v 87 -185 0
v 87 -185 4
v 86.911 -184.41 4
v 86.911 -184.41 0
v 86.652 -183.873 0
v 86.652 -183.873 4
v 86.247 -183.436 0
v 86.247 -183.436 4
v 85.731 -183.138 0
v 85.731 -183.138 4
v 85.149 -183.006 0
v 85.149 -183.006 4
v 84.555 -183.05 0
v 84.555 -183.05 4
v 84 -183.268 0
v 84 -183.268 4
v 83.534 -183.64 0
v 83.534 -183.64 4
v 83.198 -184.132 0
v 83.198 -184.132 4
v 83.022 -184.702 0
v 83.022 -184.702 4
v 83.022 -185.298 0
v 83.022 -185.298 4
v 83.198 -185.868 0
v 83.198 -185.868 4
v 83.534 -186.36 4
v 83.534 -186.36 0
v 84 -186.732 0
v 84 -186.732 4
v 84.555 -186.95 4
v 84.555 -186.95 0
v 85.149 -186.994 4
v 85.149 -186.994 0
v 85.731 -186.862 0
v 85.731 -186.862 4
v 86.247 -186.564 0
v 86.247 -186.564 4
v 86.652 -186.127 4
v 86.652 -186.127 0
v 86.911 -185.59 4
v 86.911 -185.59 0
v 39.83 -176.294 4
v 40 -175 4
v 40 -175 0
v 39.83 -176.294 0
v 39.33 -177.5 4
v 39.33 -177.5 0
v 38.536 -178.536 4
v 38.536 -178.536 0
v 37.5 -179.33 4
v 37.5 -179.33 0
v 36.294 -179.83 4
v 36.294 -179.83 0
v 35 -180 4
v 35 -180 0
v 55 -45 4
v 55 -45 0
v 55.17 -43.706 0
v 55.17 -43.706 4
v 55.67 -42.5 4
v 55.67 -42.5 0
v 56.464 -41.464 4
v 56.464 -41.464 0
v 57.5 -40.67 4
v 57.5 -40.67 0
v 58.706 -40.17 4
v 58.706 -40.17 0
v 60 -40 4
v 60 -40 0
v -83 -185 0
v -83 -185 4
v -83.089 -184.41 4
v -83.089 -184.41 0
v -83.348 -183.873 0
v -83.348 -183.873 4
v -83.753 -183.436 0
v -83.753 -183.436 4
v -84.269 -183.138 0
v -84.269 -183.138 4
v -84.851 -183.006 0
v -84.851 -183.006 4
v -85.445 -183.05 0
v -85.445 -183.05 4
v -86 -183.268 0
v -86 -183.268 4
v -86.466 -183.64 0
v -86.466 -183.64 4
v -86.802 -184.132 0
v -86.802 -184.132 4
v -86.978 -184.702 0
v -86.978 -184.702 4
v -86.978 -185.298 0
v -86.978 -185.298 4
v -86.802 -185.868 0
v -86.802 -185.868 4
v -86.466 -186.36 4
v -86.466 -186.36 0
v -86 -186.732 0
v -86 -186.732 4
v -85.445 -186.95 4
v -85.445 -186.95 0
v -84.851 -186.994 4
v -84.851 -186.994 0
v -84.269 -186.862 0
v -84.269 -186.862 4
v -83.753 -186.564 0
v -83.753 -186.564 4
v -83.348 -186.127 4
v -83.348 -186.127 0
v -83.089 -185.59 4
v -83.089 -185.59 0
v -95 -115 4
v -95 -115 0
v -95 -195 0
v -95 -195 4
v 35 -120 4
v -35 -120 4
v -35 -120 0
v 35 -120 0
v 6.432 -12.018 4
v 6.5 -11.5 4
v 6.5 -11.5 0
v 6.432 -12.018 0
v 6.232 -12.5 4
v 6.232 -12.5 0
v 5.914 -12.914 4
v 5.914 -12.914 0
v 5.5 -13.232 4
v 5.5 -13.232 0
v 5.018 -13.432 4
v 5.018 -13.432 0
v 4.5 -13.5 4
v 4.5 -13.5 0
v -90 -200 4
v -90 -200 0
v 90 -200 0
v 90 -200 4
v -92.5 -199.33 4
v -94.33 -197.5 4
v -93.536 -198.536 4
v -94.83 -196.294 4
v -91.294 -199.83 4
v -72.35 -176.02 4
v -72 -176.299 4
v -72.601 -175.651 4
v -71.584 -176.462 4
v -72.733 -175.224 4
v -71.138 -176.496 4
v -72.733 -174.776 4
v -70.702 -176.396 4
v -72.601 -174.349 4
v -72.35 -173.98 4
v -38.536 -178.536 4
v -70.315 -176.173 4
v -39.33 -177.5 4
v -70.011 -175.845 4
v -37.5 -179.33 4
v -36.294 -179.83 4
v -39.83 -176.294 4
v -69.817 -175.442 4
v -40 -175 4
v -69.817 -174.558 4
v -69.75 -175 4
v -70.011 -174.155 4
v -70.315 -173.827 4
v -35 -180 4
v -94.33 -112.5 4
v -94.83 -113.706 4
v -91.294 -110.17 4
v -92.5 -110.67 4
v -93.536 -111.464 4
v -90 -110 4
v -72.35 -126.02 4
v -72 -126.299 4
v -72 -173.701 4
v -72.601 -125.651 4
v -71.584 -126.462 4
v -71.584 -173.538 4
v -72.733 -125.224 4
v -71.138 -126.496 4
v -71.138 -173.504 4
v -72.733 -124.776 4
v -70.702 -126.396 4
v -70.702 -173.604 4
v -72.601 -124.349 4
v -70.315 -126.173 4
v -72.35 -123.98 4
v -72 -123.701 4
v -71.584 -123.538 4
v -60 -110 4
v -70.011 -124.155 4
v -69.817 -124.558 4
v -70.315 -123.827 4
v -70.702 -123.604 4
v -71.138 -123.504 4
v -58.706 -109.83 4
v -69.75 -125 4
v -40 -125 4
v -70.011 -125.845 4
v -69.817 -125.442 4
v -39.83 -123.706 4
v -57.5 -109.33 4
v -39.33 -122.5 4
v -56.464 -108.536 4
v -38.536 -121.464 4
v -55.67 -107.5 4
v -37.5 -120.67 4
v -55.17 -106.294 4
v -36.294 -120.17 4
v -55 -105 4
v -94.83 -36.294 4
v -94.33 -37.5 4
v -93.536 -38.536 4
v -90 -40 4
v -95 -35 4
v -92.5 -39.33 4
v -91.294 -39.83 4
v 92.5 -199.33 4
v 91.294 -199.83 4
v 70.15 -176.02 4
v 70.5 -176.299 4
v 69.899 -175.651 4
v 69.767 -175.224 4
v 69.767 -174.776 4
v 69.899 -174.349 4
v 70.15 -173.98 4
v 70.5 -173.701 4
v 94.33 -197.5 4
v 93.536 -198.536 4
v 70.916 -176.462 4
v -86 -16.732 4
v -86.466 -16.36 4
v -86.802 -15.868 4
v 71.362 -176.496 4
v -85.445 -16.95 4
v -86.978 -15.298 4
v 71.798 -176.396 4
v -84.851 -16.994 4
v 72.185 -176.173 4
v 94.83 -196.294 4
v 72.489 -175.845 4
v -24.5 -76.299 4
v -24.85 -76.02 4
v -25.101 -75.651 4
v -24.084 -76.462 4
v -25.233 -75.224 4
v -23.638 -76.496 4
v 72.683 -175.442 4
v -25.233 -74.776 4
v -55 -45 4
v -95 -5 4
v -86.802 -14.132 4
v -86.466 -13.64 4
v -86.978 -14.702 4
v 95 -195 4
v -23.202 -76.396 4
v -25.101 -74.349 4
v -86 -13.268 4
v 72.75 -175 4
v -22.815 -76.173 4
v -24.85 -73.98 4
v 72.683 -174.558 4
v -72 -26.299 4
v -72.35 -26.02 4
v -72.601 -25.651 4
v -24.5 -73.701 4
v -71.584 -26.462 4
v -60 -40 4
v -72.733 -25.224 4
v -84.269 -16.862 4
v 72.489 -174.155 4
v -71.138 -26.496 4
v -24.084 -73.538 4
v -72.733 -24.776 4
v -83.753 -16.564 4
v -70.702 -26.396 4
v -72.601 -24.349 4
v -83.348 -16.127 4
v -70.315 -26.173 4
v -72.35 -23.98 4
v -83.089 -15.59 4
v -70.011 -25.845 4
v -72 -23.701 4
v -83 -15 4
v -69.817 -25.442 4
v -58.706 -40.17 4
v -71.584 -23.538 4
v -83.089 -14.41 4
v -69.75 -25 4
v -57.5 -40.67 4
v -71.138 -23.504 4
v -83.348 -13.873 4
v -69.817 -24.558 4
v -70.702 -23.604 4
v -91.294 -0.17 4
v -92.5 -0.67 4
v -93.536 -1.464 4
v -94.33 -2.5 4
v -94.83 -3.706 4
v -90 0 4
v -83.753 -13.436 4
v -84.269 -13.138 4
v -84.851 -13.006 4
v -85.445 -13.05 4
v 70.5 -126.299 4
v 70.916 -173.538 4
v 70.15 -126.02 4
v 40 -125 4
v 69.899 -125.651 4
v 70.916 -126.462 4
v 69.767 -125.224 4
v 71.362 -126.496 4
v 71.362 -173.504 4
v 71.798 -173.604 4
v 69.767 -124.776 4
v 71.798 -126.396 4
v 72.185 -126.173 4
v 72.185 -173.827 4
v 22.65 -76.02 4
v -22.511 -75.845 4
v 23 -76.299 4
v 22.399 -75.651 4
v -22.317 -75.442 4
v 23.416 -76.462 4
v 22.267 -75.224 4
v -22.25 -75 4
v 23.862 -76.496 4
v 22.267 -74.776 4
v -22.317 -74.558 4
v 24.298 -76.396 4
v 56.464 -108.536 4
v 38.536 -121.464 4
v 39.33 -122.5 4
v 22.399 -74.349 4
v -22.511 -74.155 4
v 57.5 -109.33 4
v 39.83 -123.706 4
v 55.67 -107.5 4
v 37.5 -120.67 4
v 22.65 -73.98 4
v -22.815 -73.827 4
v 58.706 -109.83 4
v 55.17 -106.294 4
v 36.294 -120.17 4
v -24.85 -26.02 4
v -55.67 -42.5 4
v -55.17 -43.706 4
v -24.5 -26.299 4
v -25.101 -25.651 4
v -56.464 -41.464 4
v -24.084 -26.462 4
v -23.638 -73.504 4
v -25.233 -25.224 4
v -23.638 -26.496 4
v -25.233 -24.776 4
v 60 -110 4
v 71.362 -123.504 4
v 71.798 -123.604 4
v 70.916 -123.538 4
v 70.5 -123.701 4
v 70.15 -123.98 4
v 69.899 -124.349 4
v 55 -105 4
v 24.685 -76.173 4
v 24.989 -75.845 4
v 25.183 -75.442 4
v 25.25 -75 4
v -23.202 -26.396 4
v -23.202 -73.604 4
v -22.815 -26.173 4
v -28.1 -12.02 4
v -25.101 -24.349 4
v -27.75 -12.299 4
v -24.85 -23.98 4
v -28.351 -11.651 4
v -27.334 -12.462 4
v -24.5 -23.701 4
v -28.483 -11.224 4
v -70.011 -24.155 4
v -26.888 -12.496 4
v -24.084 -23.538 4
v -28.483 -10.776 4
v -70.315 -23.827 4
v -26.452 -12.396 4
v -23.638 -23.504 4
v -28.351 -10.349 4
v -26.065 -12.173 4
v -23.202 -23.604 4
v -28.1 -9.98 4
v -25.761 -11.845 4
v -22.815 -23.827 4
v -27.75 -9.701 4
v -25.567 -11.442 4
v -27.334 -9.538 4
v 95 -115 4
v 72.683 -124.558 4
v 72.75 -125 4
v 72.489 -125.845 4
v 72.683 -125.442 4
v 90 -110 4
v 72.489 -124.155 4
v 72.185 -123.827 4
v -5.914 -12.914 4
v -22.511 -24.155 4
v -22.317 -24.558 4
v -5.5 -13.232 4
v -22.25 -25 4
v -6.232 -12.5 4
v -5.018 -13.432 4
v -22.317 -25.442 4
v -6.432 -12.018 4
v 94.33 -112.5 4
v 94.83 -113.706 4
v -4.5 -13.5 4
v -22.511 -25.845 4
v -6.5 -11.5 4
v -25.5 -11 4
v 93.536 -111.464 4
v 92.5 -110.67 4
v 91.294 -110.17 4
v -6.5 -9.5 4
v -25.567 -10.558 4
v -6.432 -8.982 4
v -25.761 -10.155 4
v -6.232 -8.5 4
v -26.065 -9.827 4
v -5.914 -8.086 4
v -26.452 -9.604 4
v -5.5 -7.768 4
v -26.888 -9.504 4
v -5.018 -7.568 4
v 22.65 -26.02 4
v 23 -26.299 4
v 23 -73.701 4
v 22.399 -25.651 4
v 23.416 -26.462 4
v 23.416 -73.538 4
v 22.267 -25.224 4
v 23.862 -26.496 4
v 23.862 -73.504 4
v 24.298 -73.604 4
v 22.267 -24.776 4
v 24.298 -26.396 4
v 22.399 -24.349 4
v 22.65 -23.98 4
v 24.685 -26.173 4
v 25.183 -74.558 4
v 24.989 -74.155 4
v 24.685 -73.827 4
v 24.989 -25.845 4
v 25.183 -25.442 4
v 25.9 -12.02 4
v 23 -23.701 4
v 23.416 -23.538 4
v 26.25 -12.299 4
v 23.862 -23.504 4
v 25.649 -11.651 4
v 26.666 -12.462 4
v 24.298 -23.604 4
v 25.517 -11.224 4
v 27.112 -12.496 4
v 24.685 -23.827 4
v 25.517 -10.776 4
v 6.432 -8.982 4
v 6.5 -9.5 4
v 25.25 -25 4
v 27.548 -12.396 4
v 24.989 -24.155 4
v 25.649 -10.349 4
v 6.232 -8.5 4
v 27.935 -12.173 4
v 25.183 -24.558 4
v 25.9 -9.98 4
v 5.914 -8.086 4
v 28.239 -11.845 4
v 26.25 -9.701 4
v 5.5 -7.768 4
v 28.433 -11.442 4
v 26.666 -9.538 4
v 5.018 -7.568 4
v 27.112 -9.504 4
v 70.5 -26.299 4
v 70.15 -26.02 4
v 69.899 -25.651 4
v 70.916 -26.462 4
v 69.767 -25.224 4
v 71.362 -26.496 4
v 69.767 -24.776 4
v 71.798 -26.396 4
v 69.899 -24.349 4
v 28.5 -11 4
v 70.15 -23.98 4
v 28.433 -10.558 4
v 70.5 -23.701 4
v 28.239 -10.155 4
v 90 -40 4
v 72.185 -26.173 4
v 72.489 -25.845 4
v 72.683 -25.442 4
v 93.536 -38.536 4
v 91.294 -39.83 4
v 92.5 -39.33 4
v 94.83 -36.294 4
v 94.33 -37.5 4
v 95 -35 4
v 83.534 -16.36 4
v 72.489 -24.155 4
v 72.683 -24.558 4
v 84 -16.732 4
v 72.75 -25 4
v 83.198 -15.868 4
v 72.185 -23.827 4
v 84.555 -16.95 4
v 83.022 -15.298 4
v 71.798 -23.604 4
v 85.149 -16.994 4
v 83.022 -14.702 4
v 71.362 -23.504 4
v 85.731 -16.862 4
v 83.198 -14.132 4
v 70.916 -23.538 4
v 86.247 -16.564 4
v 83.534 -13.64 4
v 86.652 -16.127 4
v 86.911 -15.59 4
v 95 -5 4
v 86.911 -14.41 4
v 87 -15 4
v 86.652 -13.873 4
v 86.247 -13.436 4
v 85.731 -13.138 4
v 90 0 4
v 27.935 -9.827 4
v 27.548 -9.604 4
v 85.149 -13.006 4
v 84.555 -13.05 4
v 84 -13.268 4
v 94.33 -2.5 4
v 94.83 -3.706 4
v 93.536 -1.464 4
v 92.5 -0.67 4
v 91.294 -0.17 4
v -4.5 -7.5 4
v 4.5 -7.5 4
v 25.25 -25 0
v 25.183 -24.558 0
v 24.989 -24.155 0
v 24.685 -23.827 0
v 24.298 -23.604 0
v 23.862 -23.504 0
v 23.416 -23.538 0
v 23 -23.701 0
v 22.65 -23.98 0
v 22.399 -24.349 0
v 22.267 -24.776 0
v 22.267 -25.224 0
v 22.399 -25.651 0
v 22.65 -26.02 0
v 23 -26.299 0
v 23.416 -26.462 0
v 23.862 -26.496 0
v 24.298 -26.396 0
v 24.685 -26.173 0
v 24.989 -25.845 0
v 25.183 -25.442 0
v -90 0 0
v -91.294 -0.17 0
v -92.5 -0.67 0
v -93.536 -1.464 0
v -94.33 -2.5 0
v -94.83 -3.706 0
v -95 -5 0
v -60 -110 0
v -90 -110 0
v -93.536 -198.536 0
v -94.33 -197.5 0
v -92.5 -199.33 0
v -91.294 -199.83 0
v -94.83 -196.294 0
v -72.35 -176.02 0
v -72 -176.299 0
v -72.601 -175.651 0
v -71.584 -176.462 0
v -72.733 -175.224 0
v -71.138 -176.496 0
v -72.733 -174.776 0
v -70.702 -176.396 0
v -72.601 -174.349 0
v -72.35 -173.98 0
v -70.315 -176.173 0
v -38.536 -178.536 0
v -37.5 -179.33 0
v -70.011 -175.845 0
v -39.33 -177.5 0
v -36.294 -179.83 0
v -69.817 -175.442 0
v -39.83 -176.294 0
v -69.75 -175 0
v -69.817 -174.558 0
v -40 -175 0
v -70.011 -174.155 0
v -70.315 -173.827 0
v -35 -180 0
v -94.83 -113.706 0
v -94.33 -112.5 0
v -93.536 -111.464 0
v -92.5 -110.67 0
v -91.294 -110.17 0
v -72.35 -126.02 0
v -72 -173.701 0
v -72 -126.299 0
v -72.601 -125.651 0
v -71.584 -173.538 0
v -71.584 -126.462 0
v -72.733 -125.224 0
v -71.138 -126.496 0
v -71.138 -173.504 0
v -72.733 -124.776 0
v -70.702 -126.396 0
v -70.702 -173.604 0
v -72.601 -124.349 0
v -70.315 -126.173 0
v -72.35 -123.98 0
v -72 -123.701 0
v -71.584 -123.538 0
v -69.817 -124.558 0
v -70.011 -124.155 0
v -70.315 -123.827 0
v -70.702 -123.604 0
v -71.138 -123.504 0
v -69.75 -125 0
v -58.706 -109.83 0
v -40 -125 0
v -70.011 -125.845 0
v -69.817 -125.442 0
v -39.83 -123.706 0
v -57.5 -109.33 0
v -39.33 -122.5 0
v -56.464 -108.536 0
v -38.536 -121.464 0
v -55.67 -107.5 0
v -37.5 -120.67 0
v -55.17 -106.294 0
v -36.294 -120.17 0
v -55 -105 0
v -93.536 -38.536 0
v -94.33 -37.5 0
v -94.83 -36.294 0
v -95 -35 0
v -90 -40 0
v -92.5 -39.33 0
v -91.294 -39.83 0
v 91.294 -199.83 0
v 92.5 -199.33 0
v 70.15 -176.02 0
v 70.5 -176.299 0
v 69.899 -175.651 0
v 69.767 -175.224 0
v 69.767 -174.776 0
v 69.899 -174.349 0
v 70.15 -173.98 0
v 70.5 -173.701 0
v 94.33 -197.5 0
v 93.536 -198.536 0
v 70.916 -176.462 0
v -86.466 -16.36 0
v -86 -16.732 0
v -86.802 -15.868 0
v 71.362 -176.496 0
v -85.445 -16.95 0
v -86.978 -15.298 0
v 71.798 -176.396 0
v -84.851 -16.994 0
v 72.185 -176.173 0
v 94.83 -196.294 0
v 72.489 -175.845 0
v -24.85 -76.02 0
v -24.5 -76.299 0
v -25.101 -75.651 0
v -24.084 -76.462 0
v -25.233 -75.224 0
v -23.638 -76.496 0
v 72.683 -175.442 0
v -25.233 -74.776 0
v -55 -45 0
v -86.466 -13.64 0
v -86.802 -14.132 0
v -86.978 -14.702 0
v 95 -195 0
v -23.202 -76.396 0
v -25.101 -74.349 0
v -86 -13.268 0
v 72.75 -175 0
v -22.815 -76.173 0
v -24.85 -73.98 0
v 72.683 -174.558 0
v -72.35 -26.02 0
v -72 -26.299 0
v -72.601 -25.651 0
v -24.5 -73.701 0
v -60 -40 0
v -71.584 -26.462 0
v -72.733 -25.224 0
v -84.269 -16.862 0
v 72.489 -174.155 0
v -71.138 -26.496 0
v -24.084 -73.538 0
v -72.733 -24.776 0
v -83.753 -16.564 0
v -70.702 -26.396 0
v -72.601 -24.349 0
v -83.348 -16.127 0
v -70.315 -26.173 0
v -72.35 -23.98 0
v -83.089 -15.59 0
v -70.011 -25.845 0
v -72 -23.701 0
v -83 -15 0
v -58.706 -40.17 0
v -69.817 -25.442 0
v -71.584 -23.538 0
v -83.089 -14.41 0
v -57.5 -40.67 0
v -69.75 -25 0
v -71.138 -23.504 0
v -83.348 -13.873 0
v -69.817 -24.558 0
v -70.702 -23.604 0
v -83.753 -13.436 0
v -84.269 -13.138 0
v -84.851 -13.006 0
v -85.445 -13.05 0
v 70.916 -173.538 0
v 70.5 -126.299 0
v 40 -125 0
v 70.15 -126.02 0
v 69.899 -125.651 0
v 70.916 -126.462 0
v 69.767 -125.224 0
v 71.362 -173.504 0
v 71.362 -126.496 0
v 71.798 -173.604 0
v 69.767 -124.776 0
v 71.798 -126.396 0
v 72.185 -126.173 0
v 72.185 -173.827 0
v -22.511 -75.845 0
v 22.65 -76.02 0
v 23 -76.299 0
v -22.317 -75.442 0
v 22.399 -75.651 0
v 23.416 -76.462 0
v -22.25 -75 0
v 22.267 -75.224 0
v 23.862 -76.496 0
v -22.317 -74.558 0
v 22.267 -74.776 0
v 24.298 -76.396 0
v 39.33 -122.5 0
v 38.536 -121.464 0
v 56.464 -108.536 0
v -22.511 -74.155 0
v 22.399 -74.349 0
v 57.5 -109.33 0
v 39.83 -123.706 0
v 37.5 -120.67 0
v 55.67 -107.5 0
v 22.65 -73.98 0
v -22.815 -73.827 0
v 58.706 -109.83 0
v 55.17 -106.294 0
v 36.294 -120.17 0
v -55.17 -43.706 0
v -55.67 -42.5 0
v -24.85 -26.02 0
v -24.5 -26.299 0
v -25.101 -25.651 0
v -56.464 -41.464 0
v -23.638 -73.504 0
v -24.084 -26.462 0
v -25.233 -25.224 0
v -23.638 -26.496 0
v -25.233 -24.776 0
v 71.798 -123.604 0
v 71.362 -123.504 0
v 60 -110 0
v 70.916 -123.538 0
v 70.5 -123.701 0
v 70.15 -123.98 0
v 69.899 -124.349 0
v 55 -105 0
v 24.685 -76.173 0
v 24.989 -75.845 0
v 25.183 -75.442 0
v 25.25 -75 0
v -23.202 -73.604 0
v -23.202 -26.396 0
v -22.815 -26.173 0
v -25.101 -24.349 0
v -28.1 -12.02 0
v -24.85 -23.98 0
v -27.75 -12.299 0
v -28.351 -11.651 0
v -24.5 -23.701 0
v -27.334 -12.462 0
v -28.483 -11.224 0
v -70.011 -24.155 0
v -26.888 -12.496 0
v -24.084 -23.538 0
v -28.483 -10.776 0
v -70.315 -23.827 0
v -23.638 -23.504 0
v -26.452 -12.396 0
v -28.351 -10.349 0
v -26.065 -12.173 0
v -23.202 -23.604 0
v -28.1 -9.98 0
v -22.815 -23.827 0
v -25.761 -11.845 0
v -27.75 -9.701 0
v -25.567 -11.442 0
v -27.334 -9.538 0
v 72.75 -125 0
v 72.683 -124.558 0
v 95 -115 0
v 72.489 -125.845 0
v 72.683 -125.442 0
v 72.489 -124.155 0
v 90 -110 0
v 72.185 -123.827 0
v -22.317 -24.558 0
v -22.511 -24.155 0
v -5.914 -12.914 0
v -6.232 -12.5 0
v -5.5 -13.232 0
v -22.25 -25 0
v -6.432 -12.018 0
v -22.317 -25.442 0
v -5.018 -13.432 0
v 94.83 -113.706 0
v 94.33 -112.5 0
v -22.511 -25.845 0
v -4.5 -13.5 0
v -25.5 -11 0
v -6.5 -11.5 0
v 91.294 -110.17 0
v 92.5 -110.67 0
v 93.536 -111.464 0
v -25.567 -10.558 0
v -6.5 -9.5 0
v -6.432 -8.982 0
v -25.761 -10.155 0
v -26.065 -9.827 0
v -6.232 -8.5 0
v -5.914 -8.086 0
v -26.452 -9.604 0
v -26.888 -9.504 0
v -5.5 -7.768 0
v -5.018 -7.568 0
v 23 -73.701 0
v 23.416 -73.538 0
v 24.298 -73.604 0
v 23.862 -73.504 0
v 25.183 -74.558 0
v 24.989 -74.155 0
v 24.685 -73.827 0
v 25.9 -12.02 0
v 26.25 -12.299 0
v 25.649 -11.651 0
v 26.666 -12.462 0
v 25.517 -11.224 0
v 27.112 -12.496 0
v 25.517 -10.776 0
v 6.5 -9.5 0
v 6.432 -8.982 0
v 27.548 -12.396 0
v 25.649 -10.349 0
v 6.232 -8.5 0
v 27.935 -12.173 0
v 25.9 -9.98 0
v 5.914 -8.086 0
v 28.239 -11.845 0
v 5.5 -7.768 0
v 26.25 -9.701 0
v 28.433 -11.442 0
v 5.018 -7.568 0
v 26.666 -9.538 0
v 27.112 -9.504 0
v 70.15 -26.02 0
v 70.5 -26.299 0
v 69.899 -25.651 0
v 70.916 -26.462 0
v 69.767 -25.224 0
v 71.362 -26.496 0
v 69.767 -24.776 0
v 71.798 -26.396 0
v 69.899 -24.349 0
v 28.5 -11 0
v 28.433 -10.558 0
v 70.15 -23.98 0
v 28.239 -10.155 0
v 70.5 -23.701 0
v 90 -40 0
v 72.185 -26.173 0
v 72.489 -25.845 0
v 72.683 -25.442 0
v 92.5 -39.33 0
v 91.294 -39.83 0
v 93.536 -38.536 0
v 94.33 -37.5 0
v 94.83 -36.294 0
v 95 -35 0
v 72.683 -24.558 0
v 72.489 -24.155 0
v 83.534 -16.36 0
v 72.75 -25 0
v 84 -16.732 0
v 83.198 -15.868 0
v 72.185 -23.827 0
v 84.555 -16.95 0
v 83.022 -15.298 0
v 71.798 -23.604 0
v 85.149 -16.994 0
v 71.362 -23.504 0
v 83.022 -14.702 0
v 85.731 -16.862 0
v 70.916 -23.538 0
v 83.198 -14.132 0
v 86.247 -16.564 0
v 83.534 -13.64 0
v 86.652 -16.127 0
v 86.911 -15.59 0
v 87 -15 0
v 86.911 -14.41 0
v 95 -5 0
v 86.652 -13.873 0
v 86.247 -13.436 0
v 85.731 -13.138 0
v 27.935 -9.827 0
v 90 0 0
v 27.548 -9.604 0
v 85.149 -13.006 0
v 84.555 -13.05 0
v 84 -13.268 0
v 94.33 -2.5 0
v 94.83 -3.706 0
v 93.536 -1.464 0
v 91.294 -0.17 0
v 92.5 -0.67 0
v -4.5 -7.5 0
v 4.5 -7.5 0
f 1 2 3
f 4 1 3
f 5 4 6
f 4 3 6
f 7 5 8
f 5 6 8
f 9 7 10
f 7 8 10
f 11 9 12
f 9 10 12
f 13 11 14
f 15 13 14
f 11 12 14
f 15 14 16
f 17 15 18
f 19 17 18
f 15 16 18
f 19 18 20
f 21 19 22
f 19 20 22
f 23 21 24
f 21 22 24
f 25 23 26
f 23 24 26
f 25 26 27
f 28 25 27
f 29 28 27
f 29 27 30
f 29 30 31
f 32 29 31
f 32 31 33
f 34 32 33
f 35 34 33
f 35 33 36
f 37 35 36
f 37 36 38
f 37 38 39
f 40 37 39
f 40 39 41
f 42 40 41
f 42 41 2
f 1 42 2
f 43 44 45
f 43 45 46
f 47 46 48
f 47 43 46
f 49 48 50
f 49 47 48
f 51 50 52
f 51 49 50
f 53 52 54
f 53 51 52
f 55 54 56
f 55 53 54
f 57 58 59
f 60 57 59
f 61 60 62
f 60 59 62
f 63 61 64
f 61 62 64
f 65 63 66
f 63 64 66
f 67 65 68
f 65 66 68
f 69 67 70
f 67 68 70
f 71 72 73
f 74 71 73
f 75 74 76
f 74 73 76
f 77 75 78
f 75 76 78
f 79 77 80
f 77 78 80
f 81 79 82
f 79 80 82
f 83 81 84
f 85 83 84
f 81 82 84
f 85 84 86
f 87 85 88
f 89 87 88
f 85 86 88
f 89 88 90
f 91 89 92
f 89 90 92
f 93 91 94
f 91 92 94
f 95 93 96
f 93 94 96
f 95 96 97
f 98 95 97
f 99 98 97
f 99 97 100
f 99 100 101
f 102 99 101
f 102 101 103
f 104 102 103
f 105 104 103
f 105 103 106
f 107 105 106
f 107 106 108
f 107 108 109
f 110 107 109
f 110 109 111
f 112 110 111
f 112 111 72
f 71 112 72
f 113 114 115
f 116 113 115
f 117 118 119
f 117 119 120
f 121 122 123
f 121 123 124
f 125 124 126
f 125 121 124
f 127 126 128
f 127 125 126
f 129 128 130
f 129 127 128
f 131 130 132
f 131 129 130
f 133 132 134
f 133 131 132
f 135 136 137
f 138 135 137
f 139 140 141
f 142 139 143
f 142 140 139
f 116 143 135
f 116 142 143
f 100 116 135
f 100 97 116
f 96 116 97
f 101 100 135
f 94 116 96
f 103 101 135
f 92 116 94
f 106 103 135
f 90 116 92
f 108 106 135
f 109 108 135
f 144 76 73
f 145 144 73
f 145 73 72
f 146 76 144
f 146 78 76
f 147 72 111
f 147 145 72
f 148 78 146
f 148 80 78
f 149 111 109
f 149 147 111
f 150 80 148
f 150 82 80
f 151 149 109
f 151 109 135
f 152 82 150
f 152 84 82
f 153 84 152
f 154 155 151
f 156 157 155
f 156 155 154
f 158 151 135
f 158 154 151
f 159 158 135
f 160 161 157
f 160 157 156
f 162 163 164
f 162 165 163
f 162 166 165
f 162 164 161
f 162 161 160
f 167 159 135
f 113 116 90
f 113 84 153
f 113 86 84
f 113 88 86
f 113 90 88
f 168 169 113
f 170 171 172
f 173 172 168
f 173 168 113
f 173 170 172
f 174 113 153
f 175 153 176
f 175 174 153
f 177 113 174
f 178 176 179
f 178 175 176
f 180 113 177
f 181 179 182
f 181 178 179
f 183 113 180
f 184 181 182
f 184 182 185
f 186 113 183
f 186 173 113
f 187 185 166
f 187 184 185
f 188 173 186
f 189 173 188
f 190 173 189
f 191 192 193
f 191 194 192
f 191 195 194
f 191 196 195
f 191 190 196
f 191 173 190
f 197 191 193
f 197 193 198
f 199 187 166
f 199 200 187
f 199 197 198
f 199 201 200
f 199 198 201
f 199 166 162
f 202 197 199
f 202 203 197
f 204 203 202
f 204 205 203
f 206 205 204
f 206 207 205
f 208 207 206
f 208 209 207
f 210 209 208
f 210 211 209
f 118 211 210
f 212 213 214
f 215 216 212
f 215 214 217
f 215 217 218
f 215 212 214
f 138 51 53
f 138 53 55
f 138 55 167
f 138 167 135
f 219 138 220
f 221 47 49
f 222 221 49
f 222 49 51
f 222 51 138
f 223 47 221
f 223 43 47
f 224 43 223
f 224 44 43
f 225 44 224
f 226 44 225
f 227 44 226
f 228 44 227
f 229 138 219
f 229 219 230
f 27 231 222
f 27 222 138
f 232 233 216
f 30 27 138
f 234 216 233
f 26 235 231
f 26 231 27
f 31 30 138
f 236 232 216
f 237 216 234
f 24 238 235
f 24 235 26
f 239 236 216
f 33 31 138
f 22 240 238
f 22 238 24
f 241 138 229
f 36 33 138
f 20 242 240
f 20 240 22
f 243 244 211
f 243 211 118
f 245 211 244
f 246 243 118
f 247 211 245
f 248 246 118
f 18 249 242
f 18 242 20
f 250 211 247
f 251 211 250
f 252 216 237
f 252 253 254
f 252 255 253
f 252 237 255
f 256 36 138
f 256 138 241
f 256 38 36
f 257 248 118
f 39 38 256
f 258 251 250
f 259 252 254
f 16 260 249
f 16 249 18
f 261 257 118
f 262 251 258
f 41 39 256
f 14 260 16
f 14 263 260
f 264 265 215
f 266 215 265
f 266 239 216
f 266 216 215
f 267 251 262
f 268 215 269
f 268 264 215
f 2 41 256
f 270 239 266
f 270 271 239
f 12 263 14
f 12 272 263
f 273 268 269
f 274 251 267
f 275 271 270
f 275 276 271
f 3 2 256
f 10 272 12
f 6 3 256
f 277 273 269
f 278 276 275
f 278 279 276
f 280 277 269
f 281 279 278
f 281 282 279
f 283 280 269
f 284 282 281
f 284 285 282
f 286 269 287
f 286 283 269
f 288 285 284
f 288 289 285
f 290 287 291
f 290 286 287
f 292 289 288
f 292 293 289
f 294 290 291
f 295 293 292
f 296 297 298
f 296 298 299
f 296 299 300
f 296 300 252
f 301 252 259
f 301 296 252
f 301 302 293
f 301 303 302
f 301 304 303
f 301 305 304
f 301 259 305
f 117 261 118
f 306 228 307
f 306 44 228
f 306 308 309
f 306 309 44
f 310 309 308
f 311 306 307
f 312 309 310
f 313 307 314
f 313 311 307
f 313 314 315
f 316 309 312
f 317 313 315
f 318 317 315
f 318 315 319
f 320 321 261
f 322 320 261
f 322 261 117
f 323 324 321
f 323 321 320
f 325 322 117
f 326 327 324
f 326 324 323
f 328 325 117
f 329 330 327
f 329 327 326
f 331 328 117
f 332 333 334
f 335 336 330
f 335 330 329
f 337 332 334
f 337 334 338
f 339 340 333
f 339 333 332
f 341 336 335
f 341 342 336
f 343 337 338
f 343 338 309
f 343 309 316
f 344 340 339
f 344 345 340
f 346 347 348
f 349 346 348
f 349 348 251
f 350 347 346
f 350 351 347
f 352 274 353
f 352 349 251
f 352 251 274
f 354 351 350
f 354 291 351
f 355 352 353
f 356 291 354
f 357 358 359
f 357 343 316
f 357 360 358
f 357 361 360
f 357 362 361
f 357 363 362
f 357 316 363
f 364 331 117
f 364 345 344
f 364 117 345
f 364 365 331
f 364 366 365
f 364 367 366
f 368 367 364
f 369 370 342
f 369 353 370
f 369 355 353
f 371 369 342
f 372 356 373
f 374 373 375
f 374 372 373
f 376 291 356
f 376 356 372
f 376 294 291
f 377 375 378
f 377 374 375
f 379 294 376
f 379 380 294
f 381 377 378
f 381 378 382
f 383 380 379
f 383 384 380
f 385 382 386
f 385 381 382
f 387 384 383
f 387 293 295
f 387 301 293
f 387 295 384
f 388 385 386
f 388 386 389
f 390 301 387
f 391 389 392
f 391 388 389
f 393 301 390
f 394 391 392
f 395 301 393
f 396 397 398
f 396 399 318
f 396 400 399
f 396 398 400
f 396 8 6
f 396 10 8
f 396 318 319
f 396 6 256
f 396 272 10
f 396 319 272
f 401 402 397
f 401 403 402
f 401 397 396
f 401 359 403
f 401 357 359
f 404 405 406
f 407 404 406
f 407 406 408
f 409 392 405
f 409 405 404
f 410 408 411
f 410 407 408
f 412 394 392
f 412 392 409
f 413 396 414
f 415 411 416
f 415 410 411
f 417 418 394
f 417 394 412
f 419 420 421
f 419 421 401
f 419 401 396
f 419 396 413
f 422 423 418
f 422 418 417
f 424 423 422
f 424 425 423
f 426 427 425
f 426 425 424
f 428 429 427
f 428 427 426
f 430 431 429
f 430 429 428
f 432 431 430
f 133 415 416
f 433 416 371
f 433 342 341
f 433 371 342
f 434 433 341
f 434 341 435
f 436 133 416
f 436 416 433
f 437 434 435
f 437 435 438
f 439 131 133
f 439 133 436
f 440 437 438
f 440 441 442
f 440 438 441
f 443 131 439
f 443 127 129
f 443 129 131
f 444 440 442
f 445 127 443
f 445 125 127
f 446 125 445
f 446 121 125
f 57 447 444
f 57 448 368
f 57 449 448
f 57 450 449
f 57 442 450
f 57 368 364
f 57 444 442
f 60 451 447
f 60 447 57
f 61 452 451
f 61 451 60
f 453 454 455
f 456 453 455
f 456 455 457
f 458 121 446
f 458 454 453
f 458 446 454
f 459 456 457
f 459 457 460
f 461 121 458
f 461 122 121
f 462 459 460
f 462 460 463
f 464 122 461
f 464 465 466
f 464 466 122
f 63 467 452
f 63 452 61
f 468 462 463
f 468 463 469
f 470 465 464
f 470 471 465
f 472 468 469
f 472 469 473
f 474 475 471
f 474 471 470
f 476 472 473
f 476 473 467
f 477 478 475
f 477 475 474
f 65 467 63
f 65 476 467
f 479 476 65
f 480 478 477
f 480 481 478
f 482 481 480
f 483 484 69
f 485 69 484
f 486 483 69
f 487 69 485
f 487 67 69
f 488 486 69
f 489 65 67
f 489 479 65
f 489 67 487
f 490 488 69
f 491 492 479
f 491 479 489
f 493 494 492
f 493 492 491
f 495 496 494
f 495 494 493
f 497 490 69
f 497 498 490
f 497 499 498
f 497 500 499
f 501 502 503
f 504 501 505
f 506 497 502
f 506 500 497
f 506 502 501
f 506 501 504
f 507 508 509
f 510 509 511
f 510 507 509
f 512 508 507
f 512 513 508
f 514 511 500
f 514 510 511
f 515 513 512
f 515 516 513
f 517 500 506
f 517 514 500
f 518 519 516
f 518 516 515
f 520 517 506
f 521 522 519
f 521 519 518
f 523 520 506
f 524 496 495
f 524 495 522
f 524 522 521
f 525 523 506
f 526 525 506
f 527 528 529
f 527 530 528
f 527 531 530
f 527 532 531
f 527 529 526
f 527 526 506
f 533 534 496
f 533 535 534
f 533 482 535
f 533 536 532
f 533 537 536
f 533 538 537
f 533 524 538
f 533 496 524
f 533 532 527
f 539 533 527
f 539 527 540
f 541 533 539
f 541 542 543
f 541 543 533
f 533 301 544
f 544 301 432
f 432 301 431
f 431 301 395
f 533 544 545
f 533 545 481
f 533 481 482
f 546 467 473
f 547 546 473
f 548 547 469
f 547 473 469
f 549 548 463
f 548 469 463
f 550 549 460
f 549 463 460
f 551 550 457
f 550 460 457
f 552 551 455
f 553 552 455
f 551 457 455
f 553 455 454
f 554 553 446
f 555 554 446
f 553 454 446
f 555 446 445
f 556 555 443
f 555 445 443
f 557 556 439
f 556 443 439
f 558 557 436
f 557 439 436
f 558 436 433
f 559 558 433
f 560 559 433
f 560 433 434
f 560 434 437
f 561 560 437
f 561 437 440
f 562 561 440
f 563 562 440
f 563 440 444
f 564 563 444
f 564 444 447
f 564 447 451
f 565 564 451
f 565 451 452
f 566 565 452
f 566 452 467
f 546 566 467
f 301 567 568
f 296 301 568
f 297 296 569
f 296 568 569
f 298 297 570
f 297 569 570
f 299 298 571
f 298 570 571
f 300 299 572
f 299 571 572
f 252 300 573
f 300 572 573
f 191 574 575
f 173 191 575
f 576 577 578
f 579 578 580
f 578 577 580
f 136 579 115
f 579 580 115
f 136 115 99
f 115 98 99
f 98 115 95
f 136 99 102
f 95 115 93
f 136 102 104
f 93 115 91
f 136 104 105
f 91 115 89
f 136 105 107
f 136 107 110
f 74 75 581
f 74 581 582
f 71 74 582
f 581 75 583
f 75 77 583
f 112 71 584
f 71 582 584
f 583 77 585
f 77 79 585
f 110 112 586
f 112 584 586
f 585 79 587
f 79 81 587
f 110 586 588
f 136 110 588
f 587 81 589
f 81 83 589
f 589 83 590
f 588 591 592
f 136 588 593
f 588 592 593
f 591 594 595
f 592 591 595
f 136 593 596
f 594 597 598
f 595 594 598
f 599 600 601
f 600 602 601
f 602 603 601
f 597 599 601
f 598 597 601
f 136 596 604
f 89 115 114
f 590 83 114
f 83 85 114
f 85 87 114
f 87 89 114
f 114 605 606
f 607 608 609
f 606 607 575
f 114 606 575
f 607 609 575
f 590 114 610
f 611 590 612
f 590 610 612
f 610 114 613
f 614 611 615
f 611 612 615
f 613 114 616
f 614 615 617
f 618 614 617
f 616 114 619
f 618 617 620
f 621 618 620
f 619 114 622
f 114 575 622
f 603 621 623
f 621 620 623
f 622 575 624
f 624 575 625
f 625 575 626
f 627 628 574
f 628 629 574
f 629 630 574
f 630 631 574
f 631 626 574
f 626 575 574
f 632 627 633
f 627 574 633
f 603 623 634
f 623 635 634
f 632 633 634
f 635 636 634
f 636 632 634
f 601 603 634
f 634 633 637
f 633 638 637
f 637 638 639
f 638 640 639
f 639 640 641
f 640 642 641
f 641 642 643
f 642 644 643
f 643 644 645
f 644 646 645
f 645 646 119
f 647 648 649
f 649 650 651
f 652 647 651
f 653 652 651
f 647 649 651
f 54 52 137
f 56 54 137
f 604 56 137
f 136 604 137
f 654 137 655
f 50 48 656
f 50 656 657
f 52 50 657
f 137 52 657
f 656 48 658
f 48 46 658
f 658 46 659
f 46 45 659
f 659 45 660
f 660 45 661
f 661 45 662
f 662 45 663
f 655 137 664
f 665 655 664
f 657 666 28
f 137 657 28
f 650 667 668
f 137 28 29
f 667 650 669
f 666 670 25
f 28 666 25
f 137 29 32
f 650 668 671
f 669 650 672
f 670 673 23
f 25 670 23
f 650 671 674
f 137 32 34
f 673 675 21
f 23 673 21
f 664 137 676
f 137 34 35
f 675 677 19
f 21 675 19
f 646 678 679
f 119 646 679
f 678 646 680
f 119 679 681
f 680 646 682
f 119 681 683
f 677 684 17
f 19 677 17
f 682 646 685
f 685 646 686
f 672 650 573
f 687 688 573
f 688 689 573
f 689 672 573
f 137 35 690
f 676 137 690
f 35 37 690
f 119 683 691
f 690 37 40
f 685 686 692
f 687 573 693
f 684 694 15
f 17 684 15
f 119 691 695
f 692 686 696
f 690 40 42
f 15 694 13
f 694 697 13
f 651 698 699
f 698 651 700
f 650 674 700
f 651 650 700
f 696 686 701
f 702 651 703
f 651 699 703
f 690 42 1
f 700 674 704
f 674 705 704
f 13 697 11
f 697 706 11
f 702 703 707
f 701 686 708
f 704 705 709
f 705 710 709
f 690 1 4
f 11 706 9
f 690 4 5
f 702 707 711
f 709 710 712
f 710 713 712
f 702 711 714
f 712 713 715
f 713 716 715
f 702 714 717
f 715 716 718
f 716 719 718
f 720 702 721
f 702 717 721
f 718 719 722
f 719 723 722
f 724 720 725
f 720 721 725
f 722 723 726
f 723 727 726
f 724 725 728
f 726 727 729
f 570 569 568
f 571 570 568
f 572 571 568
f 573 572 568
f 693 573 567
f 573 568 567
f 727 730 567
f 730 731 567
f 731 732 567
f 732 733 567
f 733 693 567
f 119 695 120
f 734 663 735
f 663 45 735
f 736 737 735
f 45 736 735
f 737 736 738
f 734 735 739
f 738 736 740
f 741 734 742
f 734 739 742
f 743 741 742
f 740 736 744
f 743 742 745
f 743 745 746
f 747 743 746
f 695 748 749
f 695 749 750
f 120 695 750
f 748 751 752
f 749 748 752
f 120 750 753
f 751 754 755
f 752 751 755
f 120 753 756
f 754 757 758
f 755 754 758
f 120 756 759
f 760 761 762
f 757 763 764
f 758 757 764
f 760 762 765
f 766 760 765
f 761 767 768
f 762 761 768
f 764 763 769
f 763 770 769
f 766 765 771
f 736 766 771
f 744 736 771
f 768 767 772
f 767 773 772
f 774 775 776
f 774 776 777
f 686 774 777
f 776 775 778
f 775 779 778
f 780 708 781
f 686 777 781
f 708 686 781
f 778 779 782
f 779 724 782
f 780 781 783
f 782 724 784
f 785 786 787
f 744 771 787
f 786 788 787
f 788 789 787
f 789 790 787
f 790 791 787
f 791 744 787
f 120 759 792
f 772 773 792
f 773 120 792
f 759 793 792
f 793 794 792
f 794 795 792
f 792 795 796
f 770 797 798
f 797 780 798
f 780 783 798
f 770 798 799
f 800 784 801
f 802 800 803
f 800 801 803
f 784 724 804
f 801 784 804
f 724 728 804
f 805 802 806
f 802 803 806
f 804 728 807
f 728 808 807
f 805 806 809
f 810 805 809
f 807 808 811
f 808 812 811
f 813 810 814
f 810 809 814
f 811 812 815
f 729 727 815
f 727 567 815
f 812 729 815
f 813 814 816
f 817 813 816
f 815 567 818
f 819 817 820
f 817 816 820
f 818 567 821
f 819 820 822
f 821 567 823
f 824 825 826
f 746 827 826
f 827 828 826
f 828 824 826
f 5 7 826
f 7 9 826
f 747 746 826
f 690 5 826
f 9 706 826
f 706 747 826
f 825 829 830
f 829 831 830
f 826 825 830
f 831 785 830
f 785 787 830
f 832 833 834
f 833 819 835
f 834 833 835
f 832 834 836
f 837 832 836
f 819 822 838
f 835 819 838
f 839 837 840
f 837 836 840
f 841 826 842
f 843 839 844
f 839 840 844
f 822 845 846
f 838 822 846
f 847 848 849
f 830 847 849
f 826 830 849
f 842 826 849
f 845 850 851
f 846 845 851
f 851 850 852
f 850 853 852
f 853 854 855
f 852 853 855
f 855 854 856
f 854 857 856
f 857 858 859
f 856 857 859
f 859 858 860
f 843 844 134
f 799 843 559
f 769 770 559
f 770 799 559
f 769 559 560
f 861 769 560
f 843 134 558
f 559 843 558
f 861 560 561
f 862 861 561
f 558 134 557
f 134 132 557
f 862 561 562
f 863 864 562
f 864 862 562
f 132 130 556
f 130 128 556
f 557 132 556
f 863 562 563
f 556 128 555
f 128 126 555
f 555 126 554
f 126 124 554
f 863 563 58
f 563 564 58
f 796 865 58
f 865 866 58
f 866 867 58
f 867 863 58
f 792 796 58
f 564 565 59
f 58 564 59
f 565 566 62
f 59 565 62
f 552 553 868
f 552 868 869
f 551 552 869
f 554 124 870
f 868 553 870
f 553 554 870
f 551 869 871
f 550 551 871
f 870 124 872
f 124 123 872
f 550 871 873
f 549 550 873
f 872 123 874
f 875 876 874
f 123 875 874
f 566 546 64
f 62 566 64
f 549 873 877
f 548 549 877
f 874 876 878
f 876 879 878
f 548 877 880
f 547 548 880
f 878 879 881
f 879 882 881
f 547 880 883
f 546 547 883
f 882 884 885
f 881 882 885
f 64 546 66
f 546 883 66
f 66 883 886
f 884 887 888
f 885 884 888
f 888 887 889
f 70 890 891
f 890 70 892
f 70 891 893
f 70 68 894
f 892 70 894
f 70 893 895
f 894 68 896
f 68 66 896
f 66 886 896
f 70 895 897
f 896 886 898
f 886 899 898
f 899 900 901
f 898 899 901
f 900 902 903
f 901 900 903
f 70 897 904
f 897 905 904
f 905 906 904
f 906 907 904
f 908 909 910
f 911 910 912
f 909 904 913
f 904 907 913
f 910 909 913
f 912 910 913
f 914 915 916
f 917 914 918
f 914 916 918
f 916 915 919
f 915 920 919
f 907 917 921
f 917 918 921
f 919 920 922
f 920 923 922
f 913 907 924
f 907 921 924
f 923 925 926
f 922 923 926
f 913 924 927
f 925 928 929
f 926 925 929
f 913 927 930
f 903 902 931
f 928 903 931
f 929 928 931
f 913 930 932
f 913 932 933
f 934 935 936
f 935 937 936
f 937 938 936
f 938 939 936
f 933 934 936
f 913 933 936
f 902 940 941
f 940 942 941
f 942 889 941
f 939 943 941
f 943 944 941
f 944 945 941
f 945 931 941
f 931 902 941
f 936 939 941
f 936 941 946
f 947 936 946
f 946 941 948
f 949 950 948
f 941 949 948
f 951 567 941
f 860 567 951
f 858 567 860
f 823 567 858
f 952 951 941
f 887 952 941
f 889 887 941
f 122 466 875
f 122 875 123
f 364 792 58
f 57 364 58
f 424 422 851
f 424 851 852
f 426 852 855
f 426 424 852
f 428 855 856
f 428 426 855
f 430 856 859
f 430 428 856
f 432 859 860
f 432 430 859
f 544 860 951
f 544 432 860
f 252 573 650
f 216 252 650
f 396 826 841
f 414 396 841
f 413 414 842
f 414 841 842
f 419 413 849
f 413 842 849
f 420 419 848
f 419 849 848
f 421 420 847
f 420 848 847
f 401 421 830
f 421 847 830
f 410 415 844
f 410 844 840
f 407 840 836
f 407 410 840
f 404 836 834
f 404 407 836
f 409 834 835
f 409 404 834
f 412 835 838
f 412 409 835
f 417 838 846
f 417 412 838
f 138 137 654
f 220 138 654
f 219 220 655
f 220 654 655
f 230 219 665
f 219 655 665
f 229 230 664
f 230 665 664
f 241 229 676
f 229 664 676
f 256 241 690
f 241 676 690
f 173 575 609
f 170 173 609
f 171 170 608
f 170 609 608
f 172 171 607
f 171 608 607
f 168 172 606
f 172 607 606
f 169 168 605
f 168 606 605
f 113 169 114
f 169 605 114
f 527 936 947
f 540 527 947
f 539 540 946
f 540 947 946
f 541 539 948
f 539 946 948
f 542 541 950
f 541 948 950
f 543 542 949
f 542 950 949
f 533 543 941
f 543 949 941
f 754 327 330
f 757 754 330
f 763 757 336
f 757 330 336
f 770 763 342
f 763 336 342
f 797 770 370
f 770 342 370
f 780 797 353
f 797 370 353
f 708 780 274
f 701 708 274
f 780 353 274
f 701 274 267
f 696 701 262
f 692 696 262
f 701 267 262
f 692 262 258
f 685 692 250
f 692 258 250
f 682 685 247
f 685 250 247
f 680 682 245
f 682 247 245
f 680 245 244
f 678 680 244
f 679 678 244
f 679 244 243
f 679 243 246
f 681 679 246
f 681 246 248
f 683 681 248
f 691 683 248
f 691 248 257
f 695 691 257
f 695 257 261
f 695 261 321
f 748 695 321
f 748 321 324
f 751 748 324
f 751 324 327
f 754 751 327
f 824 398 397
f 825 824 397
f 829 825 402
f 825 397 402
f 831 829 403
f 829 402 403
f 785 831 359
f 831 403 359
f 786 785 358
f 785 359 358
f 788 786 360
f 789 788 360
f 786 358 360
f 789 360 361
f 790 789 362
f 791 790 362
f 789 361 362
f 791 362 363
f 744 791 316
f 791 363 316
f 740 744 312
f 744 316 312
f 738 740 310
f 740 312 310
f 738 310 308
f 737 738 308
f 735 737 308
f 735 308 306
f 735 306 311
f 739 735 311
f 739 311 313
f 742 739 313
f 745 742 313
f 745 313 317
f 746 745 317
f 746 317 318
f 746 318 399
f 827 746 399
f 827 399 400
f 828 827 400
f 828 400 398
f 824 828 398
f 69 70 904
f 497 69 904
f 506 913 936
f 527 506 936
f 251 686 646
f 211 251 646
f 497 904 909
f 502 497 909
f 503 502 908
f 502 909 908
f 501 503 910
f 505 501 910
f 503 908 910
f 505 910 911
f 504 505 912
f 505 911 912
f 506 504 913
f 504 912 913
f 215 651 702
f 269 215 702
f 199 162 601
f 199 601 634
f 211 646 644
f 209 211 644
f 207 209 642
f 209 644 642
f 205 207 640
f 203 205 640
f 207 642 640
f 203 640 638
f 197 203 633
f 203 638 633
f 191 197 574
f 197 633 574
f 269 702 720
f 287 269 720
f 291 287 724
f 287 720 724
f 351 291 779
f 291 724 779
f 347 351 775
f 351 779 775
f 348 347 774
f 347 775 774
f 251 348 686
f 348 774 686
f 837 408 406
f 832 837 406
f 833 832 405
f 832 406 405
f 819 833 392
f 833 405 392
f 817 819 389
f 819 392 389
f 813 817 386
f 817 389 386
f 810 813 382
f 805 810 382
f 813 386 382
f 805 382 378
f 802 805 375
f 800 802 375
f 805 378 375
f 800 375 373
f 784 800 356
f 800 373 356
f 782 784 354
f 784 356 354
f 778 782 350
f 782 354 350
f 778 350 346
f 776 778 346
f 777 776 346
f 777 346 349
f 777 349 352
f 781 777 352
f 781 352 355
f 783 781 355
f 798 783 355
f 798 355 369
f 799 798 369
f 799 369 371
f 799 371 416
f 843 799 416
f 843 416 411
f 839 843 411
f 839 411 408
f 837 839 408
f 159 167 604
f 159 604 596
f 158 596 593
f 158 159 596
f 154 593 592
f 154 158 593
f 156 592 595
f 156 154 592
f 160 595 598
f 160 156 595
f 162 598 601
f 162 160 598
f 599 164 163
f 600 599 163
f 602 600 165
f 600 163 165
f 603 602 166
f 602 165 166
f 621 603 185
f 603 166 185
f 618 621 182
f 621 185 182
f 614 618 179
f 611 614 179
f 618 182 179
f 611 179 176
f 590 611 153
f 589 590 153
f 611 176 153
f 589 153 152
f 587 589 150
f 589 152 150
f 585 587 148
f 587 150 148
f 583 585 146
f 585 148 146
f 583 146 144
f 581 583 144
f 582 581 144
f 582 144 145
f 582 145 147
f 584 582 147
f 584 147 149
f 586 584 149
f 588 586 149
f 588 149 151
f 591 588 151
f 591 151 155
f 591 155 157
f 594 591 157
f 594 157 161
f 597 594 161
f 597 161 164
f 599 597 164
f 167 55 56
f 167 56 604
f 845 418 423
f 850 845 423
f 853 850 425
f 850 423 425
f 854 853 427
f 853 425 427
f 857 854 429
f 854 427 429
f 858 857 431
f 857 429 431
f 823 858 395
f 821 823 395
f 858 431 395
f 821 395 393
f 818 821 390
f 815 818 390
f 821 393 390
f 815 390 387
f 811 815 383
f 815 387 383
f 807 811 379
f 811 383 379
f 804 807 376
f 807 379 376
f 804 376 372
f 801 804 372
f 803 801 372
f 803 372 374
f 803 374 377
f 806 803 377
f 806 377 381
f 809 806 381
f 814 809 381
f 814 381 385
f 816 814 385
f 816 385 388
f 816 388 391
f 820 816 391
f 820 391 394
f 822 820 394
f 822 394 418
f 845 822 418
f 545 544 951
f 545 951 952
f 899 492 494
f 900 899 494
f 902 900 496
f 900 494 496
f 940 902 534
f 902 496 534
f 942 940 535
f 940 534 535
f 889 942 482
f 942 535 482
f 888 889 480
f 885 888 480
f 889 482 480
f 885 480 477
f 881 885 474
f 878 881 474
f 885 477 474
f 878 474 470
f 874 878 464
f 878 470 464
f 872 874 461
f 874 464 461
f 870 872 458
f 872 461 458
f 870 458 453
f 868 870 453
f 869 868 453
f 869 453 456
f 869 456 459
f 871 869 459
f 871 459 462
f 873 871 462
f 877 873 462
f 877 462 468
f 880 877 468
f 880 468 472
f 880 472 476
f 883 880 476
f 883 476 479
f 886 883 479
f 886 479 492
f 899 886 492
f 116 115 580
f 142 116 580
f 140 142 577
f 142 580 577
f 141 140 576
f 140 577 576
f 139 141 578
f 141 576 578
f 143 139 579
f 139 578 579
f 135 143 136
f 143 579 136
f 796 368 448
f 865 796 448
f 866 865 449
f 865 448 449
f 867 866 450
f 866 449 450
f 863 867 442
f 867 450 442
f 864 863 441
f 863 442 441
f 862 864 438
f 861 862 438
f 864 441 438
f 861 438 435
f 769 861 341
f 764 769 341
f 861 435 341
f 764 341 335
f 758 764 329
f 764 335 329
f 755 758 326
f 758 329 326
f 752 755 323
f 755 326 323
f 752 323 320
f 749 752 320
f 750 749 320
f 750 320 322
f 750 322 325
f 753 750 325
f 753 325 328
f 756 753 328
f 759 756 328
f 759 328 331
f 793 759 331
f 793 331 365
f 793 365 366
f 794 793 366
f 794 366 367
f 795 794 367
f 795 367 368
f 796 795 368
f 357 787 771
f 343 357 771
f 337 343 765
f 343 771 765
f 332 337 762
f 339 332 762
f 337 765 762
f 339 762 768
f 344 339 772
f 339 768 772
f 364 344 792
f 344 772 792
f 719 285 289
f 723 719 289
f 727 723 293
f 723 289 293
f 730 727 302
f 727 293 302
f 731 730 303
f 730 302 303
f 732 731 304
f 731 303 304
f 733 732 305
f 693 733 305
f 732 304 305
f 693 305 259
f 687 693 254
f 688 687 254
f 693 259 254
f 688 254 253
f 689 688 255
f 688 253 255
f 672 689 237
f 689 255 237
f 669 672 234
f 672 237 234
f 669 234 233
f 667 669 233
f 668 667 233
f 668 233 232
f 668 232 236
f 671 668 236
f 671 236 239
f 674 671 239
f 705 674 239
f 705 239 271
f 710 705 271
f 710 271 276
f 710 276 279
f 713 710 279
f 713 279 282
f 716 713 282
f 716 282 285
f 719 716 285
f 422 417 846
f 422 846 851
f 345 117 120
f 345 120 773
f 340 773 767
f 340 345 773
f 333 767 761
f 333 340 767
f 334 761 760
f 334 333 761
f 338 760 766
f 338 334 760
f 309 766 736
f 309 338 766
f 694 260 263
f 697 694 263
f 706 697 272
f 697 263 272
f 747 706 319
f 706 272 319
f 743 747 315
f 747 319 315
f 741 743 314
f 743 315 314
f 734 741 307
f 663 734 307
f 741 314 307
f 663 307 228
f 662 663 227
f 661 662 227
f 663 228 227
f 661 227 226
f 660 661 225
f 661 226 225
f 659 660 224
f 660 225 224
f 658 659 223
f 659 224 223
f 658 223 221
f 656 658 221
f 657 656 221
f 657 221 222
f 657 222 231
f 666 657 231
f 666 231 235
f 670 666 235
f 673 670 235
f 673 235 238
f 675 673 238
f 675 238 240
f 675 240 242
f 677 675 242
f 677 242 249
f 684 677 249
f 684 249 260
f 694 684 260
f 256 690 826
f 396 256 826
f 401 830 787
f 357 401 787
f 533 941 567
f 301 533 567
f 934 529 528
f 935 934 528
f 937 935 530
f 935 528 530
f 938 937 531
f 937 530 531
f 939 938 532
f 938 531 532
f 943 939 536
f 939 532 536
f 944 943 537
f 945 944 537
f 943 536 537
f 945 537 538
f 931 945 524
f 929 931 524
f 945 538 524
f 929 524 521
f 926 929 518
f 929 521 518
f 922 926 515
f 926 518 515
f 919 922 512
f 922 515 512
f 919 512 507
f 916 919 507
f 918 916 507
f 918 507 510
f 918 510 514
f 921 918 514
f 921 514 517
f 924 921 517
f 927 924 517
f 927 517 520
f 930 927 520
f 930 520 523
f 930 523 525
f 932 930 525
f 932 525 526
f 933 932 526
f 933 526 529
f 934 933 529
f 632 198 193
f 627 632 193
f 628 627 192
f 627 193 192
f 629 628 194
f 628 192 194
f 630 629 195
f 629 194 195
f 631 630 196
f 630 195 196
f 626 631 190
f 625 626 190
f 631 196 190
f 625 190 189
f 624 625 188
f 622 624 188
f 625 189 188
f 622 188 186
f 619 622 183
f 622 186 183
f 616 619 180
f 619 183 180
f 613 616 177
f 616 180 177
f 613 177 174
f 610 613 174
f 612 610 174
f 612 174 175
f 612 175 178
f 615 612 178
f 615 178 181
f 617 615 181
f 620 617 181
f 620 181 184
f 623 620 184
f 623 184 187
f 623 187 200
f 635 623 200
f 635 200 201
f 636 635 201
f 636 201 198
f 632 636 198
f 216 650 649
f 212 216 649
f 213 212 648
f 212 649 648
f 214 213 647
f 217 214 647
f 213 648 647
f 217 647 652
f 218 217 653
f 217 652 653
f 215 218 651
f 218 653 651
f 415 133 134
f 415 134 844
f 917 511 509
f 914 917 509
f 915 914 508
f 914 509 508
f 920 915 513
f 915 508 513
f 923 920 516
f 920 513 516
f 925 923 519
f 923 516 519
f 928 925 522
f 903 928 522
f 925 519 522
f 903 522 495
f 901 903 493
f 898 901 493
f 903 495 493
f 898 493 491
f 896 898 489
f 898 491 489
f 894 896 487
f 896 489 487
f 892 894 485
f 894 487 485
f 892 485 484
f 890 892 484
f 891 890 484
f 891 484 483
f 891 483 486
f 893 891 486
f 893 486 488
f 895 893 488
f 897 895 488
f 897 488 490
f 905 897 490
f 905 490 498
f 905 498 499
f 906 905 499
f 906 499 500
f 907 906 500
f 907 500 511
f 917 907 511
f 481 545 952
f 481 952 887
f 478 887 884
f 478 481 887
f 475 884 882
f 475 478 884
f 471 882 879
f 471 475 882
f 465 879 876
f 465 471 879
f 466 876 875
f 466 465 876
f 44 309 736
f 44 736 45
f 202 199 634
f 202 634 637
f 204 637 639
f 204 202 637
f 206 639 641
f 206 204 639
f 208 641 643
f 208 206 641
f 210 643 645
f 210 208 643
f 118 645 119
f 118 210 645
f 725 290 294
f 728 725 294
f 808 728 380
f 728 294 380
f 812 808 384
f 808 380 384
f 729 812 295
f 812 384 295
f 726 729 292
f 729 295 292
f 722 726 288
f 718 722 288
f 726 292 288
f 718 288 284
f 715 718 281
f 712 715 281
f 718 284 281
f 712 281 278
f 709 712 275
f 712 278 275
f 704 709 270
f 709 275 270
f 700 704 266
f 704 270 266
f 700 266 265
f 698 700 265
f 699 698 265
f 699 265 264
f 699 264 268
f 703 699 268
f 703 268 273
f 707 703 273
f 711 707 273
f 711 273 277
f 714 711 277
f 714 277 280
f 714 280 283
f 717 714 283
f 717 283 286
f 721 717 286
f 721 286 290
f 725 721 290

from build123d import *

# Parameters (mm, degrees)
BOSS_EXTRUDE1_DEPTH = 4
CUT_EXTRUDE1_DEPTH  = 4
SKETCH3_R           = 2
SKETCH3_R_2         = 1.5
CUT_EXTRUDE2_DEPTH  = 10
SKETCH4_R           = 1.5
CUT_EXTRUDE3_DEPTH  = 10


with BuildPart() as part:
    # Sketch1 → Boss-Extrude1 (new body)
    with BuildSketch(Plane.XY):
        with BuildLine():
            Line((-95, -115), (-95, -195))
            ThreePointArc((-95, -195), (-93.535533906, -198.535533906), (-90, -200))
            Line((-90, -200), (90, -200))
            ThreePointArc((90, -200), (93.535533906, -198.535533906), (95, -195))
            Line((95, -195), (95, -115))
            ThreePointArc((95, -115), (93.535533906, -111.464466094), (90, -110))
            Line((90, -110), (60, -110))
            ThreePointArc((60, -110), (56.464466094, -108.535533906), (55, -105))
            Line((55, -105), (55, -45))
            ThreePointArc((55, -45), (56.464466094, -41.464466094), (60, -40))
            Line((60, -40), (90, -40))
            ThreePointArc((90, -40), (93.535533906, -38.535533906), (95, -35))
            Line((95, -35), (95, -5))
            ThreePointArc((95, -5), (93.535533906, -1.464466094), (90, 0))
            Line((90, 0), (-90, 0))
            ThreePointArc((-90, 0), (-93.535533906, -1.464466094), (-95, -5))
            Line((-95, -5), (-95, -35))
            ThreePointArc((-95, -35), (-93.535533906, -38.535533906), (-90, -40))
            Line((-90, -40), (-60, -40))
            ThreePointArc((-60, -40), (-56.464466094, -41.464466094), (-55, -45))
            Line((-55, -45), (-55, -105))
            ThreePointArc((-55, -105), (-56.464466094, -108.535533906), (-60, -110))
            Line((-60, -110), (-90, -110))
            ThreePointArc((-90, -110), (-93.535533906, -111.464466094), (-95, -115))
        make_face()
    extrude(amount=BOSS_EXTRUDE1_DEPTH)

    # Sketch2 → Cut-Extrude1 (cut)
    with BuildSketch(Plane.XY.offset(4)):
        with BuildLine():
            Line((-35, -120), (35, -120))
            ThreePointArc((35, -120), (38.535533906, -121.464466094), (40, -125))
            Line((40, -125), (40, -175))
            ThreePointArc((40, -175), (38.535533906, -178.535533906), (35, -180))
            Line((35, -180), (-35, -180))
            ThreePointArc((-35, -180), (-38.535533906, -178.535533906), (-40, -175))
            Line((-40, -175), (-40, -125))
            ThreePointArc((-40, -125), (-38.535533906, -121.464466094), (-35, -120))
        make_face()
    extrude(amount=-CUT_EXTRUDE1_DEPTH, mode=Mode.SUBTRACT)

    # Sketch3 → Cut-Extrude2 (cut)
    with BuildSketch(Plane.XY.offset(4)):
        with Locations((-85, -15)):
            Circle(SKETCH3_R)
        with Locations((-85, -185)):
            Circle(SKETCH3_R)
        with Locations((85, -185)):
            Circle(SKETCH3_R)
        with Locations((85, -15)):
            Circle(SKETCH3_R)
        with Locations((-27, -11)):
            Circle(SKETCH3_R_2)
        with Locations((27, -11)):
            Circle(SKETCH3_R_2)
        with BuildLine():
            Line((-4.5, -7.5), (4.5, -7.5))
            ThreePointArc((4.5, -7.5), (5.914213562, -8.085786438), (6.5, -9.5))
            Line((6.5, -9.5), (6.5, -11.5))
            ThreePointArc((6.5, -11.5), (5.914213562, -12.914213562), (4.5, -13.5))
            Line((4.5, -13.5), (-4.5, -13.5))
            ThreePointArc((-4.5, -13.5), (-5.914213562, -12.914213562), (-6.5, -11.5))
            Line((-6.5, -11.5), (-6.5, -9.5))
            ThreePointArc((-6.5, -9.5), (-5.914213562, -8.085786438), (-4.5, -7.5))
        make_face()
    extrude(amount=-CUT_EXTRUDE2_DEPTH, mode=Mode.SUBTRACT)

    # Sketch4 → Cut-Extrude3 (cut)
    with BuildSketch(Plane.XY.offset(4)):
        with Locations((-71.25, -25)):
            Circle(SKETCH4_R)
        with Locations((-71.25, -75)):
            Circle(SKETCH4_R)
        with Locations((-71.25, -175)):
            Circle(SKETCH4_R)
        with Locations((-71.25, -125)):
            Circle(SKETCH4_R)
        with Locations((-23.75, -125)):
            Circle(SKETCH4_R)
        with Locations((-23.75, -175)):
            Circle(SKETCH4_R)
        with Locations((-23.75, -75)):
            Circle(SKETCH4_R)
        with Locations((-23.75, -25)):
            Circle(SKETCH4_R)
        with Locations((23.75, -25)):
            Circle(SKETCH4_R)
        with Locations((23.75, -75)):
            Circle(SKETCH4_R)
        with Locations((23.75, -175)):
            Circle(SKETCH4_R)
        with Locations((23.75, -125)):
            Circle(SKETCH4_R)
        with Locations((71.25, -125)):
            Circle(SKETCH4_R)
        with Locations((71.25, -175)):
            Circle(SKETCH4_R)
        with Locations((71.25, -75)):
            Circle(SKETCH4_R)
        with Locations((71.25, -25)):
            Circle(SKETCH4_R)
    extrude(amount=-CUT_EXTRUDE3_DEPTH, mode=Mode.SUBTRACT)


solid = part.part
